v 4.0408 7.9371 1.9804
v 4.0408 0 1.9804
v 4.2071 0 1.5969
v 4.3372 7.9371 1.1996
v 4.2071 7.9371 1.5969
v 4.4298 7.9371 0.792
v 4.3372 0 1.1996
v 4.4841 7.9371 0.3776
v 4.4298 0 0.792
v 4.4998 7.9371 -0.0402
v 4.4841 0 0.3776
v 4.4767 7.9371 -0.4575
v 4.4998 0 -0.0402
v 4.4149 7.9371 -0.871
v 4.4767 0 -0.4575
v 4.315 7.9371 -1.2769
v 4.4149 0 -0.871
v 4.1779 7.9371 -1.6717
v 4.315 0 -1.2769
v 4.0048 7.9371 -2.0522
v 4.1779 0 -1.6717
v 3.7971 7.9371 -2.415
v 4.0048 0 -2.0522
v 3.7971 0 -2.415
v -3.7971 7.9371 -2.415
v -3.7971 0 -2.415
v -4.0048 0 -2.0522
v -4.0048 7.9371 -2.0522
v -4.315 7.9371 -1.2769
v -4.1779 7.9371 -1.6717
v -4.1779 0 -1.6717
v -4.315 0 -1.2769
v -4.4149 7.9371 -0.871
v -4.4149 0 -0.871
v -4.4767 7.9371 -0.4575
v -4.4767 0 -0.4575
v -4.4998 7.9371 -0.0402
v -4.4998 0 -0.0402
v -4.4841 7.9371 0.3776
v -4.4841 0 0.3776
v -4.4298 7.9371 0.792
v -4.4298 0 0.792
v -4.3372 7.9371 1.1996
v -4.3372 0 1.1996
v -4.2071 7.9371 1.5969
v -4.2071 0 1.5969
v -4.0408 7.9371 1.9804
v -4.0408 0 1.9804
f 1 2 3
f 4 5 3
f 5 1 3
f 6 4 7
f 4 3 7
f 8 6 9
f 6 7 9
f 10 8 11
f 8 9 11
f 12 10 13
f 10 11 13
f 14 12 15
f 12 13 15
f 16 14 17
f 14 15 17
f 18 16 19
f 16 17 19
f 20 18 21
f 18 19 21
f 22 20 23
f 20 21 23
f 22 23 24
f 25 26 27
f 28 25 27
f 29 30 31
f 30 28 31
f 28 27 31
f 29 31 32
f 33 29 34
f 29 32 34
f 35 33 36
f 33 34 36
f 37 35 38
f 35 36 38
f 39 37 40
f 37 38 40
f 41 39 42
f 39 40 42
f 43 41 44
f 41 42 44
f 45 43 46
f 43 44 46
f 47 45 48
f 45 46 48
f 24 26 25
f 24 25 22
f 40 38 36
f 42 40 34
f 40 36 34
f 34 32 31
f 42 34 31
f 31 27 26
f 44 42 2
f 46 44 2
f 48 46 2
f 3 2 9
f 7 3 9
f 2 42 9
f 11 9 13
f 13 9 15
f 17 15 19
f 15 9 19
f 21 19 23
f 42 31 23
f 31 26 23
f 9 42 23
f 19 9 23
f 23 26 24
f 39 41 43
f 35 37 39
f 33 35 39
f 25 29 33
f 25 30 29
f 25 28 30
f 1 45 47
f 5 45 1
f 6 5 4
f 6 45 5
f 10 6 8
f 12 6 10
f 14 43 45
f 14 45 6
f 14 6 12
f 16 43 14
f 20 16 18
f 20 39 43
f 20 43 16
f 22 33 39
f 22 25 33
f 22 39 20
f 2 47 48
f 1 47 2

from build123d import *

# Parameters (mm, degrees)
SKETCH1_R           = 4.5
BOSS_EXTRUDE1_DEPTH = 7.9371
SKETCH2_W           = 9.255904856
SKETCH2_H           = 5.023128632
CUT_EXTRUDE1_DEPTH  = 7.9371
SKETCH3_W           = 9.61068527
SKETCH3_H           = 3.540778784
CUT_EXTRUDE2_DEPTH  = 7.9371


with BuildPart() as part:
    # Sketch1 → Boss-Extrude1 (new body)
    with BuildSketch(Plane(origin=(0, 0, 0), x_dir=(1, 0, 0), z_dir=(0, 1, 0))):
        Circle(SKETCH1_R)
    extrude(amount=BOSS_EXTRUDE1_DEPTH)

    # Sketch2 → Cut-Extrude1 (cut)
    with BuildSketch(Plane(origin=(0, 7.9371, 0), x_dir=(1, 0, 0), z_dir=(0, 1, 0))):
        with Locations((-0.035126774, 4.926530004)):
            Rectangle(SKETCH2_W, SKETCH2_H)
    extrude(amount=-CUT_EXTRUDE1_DEPTH, mode=Mode.SUBTRACT)

    # Sketch3 → Cut-Extrude2 (cut)
    with BuildSketch(Plane(origin=(0, 7.9371, 0), x_dir=(1, 0, 0), z_dir=(0, 1, 0))):
        with Locations((0.263450802, -3.750791404)):
            Rectangle(SKETCH3_W, SKETCH3_H)
    extrude(amount=-CUT_EXTRUDE2_DEPTH, mode=Mode.SUBTRACT)


solid = part.part
